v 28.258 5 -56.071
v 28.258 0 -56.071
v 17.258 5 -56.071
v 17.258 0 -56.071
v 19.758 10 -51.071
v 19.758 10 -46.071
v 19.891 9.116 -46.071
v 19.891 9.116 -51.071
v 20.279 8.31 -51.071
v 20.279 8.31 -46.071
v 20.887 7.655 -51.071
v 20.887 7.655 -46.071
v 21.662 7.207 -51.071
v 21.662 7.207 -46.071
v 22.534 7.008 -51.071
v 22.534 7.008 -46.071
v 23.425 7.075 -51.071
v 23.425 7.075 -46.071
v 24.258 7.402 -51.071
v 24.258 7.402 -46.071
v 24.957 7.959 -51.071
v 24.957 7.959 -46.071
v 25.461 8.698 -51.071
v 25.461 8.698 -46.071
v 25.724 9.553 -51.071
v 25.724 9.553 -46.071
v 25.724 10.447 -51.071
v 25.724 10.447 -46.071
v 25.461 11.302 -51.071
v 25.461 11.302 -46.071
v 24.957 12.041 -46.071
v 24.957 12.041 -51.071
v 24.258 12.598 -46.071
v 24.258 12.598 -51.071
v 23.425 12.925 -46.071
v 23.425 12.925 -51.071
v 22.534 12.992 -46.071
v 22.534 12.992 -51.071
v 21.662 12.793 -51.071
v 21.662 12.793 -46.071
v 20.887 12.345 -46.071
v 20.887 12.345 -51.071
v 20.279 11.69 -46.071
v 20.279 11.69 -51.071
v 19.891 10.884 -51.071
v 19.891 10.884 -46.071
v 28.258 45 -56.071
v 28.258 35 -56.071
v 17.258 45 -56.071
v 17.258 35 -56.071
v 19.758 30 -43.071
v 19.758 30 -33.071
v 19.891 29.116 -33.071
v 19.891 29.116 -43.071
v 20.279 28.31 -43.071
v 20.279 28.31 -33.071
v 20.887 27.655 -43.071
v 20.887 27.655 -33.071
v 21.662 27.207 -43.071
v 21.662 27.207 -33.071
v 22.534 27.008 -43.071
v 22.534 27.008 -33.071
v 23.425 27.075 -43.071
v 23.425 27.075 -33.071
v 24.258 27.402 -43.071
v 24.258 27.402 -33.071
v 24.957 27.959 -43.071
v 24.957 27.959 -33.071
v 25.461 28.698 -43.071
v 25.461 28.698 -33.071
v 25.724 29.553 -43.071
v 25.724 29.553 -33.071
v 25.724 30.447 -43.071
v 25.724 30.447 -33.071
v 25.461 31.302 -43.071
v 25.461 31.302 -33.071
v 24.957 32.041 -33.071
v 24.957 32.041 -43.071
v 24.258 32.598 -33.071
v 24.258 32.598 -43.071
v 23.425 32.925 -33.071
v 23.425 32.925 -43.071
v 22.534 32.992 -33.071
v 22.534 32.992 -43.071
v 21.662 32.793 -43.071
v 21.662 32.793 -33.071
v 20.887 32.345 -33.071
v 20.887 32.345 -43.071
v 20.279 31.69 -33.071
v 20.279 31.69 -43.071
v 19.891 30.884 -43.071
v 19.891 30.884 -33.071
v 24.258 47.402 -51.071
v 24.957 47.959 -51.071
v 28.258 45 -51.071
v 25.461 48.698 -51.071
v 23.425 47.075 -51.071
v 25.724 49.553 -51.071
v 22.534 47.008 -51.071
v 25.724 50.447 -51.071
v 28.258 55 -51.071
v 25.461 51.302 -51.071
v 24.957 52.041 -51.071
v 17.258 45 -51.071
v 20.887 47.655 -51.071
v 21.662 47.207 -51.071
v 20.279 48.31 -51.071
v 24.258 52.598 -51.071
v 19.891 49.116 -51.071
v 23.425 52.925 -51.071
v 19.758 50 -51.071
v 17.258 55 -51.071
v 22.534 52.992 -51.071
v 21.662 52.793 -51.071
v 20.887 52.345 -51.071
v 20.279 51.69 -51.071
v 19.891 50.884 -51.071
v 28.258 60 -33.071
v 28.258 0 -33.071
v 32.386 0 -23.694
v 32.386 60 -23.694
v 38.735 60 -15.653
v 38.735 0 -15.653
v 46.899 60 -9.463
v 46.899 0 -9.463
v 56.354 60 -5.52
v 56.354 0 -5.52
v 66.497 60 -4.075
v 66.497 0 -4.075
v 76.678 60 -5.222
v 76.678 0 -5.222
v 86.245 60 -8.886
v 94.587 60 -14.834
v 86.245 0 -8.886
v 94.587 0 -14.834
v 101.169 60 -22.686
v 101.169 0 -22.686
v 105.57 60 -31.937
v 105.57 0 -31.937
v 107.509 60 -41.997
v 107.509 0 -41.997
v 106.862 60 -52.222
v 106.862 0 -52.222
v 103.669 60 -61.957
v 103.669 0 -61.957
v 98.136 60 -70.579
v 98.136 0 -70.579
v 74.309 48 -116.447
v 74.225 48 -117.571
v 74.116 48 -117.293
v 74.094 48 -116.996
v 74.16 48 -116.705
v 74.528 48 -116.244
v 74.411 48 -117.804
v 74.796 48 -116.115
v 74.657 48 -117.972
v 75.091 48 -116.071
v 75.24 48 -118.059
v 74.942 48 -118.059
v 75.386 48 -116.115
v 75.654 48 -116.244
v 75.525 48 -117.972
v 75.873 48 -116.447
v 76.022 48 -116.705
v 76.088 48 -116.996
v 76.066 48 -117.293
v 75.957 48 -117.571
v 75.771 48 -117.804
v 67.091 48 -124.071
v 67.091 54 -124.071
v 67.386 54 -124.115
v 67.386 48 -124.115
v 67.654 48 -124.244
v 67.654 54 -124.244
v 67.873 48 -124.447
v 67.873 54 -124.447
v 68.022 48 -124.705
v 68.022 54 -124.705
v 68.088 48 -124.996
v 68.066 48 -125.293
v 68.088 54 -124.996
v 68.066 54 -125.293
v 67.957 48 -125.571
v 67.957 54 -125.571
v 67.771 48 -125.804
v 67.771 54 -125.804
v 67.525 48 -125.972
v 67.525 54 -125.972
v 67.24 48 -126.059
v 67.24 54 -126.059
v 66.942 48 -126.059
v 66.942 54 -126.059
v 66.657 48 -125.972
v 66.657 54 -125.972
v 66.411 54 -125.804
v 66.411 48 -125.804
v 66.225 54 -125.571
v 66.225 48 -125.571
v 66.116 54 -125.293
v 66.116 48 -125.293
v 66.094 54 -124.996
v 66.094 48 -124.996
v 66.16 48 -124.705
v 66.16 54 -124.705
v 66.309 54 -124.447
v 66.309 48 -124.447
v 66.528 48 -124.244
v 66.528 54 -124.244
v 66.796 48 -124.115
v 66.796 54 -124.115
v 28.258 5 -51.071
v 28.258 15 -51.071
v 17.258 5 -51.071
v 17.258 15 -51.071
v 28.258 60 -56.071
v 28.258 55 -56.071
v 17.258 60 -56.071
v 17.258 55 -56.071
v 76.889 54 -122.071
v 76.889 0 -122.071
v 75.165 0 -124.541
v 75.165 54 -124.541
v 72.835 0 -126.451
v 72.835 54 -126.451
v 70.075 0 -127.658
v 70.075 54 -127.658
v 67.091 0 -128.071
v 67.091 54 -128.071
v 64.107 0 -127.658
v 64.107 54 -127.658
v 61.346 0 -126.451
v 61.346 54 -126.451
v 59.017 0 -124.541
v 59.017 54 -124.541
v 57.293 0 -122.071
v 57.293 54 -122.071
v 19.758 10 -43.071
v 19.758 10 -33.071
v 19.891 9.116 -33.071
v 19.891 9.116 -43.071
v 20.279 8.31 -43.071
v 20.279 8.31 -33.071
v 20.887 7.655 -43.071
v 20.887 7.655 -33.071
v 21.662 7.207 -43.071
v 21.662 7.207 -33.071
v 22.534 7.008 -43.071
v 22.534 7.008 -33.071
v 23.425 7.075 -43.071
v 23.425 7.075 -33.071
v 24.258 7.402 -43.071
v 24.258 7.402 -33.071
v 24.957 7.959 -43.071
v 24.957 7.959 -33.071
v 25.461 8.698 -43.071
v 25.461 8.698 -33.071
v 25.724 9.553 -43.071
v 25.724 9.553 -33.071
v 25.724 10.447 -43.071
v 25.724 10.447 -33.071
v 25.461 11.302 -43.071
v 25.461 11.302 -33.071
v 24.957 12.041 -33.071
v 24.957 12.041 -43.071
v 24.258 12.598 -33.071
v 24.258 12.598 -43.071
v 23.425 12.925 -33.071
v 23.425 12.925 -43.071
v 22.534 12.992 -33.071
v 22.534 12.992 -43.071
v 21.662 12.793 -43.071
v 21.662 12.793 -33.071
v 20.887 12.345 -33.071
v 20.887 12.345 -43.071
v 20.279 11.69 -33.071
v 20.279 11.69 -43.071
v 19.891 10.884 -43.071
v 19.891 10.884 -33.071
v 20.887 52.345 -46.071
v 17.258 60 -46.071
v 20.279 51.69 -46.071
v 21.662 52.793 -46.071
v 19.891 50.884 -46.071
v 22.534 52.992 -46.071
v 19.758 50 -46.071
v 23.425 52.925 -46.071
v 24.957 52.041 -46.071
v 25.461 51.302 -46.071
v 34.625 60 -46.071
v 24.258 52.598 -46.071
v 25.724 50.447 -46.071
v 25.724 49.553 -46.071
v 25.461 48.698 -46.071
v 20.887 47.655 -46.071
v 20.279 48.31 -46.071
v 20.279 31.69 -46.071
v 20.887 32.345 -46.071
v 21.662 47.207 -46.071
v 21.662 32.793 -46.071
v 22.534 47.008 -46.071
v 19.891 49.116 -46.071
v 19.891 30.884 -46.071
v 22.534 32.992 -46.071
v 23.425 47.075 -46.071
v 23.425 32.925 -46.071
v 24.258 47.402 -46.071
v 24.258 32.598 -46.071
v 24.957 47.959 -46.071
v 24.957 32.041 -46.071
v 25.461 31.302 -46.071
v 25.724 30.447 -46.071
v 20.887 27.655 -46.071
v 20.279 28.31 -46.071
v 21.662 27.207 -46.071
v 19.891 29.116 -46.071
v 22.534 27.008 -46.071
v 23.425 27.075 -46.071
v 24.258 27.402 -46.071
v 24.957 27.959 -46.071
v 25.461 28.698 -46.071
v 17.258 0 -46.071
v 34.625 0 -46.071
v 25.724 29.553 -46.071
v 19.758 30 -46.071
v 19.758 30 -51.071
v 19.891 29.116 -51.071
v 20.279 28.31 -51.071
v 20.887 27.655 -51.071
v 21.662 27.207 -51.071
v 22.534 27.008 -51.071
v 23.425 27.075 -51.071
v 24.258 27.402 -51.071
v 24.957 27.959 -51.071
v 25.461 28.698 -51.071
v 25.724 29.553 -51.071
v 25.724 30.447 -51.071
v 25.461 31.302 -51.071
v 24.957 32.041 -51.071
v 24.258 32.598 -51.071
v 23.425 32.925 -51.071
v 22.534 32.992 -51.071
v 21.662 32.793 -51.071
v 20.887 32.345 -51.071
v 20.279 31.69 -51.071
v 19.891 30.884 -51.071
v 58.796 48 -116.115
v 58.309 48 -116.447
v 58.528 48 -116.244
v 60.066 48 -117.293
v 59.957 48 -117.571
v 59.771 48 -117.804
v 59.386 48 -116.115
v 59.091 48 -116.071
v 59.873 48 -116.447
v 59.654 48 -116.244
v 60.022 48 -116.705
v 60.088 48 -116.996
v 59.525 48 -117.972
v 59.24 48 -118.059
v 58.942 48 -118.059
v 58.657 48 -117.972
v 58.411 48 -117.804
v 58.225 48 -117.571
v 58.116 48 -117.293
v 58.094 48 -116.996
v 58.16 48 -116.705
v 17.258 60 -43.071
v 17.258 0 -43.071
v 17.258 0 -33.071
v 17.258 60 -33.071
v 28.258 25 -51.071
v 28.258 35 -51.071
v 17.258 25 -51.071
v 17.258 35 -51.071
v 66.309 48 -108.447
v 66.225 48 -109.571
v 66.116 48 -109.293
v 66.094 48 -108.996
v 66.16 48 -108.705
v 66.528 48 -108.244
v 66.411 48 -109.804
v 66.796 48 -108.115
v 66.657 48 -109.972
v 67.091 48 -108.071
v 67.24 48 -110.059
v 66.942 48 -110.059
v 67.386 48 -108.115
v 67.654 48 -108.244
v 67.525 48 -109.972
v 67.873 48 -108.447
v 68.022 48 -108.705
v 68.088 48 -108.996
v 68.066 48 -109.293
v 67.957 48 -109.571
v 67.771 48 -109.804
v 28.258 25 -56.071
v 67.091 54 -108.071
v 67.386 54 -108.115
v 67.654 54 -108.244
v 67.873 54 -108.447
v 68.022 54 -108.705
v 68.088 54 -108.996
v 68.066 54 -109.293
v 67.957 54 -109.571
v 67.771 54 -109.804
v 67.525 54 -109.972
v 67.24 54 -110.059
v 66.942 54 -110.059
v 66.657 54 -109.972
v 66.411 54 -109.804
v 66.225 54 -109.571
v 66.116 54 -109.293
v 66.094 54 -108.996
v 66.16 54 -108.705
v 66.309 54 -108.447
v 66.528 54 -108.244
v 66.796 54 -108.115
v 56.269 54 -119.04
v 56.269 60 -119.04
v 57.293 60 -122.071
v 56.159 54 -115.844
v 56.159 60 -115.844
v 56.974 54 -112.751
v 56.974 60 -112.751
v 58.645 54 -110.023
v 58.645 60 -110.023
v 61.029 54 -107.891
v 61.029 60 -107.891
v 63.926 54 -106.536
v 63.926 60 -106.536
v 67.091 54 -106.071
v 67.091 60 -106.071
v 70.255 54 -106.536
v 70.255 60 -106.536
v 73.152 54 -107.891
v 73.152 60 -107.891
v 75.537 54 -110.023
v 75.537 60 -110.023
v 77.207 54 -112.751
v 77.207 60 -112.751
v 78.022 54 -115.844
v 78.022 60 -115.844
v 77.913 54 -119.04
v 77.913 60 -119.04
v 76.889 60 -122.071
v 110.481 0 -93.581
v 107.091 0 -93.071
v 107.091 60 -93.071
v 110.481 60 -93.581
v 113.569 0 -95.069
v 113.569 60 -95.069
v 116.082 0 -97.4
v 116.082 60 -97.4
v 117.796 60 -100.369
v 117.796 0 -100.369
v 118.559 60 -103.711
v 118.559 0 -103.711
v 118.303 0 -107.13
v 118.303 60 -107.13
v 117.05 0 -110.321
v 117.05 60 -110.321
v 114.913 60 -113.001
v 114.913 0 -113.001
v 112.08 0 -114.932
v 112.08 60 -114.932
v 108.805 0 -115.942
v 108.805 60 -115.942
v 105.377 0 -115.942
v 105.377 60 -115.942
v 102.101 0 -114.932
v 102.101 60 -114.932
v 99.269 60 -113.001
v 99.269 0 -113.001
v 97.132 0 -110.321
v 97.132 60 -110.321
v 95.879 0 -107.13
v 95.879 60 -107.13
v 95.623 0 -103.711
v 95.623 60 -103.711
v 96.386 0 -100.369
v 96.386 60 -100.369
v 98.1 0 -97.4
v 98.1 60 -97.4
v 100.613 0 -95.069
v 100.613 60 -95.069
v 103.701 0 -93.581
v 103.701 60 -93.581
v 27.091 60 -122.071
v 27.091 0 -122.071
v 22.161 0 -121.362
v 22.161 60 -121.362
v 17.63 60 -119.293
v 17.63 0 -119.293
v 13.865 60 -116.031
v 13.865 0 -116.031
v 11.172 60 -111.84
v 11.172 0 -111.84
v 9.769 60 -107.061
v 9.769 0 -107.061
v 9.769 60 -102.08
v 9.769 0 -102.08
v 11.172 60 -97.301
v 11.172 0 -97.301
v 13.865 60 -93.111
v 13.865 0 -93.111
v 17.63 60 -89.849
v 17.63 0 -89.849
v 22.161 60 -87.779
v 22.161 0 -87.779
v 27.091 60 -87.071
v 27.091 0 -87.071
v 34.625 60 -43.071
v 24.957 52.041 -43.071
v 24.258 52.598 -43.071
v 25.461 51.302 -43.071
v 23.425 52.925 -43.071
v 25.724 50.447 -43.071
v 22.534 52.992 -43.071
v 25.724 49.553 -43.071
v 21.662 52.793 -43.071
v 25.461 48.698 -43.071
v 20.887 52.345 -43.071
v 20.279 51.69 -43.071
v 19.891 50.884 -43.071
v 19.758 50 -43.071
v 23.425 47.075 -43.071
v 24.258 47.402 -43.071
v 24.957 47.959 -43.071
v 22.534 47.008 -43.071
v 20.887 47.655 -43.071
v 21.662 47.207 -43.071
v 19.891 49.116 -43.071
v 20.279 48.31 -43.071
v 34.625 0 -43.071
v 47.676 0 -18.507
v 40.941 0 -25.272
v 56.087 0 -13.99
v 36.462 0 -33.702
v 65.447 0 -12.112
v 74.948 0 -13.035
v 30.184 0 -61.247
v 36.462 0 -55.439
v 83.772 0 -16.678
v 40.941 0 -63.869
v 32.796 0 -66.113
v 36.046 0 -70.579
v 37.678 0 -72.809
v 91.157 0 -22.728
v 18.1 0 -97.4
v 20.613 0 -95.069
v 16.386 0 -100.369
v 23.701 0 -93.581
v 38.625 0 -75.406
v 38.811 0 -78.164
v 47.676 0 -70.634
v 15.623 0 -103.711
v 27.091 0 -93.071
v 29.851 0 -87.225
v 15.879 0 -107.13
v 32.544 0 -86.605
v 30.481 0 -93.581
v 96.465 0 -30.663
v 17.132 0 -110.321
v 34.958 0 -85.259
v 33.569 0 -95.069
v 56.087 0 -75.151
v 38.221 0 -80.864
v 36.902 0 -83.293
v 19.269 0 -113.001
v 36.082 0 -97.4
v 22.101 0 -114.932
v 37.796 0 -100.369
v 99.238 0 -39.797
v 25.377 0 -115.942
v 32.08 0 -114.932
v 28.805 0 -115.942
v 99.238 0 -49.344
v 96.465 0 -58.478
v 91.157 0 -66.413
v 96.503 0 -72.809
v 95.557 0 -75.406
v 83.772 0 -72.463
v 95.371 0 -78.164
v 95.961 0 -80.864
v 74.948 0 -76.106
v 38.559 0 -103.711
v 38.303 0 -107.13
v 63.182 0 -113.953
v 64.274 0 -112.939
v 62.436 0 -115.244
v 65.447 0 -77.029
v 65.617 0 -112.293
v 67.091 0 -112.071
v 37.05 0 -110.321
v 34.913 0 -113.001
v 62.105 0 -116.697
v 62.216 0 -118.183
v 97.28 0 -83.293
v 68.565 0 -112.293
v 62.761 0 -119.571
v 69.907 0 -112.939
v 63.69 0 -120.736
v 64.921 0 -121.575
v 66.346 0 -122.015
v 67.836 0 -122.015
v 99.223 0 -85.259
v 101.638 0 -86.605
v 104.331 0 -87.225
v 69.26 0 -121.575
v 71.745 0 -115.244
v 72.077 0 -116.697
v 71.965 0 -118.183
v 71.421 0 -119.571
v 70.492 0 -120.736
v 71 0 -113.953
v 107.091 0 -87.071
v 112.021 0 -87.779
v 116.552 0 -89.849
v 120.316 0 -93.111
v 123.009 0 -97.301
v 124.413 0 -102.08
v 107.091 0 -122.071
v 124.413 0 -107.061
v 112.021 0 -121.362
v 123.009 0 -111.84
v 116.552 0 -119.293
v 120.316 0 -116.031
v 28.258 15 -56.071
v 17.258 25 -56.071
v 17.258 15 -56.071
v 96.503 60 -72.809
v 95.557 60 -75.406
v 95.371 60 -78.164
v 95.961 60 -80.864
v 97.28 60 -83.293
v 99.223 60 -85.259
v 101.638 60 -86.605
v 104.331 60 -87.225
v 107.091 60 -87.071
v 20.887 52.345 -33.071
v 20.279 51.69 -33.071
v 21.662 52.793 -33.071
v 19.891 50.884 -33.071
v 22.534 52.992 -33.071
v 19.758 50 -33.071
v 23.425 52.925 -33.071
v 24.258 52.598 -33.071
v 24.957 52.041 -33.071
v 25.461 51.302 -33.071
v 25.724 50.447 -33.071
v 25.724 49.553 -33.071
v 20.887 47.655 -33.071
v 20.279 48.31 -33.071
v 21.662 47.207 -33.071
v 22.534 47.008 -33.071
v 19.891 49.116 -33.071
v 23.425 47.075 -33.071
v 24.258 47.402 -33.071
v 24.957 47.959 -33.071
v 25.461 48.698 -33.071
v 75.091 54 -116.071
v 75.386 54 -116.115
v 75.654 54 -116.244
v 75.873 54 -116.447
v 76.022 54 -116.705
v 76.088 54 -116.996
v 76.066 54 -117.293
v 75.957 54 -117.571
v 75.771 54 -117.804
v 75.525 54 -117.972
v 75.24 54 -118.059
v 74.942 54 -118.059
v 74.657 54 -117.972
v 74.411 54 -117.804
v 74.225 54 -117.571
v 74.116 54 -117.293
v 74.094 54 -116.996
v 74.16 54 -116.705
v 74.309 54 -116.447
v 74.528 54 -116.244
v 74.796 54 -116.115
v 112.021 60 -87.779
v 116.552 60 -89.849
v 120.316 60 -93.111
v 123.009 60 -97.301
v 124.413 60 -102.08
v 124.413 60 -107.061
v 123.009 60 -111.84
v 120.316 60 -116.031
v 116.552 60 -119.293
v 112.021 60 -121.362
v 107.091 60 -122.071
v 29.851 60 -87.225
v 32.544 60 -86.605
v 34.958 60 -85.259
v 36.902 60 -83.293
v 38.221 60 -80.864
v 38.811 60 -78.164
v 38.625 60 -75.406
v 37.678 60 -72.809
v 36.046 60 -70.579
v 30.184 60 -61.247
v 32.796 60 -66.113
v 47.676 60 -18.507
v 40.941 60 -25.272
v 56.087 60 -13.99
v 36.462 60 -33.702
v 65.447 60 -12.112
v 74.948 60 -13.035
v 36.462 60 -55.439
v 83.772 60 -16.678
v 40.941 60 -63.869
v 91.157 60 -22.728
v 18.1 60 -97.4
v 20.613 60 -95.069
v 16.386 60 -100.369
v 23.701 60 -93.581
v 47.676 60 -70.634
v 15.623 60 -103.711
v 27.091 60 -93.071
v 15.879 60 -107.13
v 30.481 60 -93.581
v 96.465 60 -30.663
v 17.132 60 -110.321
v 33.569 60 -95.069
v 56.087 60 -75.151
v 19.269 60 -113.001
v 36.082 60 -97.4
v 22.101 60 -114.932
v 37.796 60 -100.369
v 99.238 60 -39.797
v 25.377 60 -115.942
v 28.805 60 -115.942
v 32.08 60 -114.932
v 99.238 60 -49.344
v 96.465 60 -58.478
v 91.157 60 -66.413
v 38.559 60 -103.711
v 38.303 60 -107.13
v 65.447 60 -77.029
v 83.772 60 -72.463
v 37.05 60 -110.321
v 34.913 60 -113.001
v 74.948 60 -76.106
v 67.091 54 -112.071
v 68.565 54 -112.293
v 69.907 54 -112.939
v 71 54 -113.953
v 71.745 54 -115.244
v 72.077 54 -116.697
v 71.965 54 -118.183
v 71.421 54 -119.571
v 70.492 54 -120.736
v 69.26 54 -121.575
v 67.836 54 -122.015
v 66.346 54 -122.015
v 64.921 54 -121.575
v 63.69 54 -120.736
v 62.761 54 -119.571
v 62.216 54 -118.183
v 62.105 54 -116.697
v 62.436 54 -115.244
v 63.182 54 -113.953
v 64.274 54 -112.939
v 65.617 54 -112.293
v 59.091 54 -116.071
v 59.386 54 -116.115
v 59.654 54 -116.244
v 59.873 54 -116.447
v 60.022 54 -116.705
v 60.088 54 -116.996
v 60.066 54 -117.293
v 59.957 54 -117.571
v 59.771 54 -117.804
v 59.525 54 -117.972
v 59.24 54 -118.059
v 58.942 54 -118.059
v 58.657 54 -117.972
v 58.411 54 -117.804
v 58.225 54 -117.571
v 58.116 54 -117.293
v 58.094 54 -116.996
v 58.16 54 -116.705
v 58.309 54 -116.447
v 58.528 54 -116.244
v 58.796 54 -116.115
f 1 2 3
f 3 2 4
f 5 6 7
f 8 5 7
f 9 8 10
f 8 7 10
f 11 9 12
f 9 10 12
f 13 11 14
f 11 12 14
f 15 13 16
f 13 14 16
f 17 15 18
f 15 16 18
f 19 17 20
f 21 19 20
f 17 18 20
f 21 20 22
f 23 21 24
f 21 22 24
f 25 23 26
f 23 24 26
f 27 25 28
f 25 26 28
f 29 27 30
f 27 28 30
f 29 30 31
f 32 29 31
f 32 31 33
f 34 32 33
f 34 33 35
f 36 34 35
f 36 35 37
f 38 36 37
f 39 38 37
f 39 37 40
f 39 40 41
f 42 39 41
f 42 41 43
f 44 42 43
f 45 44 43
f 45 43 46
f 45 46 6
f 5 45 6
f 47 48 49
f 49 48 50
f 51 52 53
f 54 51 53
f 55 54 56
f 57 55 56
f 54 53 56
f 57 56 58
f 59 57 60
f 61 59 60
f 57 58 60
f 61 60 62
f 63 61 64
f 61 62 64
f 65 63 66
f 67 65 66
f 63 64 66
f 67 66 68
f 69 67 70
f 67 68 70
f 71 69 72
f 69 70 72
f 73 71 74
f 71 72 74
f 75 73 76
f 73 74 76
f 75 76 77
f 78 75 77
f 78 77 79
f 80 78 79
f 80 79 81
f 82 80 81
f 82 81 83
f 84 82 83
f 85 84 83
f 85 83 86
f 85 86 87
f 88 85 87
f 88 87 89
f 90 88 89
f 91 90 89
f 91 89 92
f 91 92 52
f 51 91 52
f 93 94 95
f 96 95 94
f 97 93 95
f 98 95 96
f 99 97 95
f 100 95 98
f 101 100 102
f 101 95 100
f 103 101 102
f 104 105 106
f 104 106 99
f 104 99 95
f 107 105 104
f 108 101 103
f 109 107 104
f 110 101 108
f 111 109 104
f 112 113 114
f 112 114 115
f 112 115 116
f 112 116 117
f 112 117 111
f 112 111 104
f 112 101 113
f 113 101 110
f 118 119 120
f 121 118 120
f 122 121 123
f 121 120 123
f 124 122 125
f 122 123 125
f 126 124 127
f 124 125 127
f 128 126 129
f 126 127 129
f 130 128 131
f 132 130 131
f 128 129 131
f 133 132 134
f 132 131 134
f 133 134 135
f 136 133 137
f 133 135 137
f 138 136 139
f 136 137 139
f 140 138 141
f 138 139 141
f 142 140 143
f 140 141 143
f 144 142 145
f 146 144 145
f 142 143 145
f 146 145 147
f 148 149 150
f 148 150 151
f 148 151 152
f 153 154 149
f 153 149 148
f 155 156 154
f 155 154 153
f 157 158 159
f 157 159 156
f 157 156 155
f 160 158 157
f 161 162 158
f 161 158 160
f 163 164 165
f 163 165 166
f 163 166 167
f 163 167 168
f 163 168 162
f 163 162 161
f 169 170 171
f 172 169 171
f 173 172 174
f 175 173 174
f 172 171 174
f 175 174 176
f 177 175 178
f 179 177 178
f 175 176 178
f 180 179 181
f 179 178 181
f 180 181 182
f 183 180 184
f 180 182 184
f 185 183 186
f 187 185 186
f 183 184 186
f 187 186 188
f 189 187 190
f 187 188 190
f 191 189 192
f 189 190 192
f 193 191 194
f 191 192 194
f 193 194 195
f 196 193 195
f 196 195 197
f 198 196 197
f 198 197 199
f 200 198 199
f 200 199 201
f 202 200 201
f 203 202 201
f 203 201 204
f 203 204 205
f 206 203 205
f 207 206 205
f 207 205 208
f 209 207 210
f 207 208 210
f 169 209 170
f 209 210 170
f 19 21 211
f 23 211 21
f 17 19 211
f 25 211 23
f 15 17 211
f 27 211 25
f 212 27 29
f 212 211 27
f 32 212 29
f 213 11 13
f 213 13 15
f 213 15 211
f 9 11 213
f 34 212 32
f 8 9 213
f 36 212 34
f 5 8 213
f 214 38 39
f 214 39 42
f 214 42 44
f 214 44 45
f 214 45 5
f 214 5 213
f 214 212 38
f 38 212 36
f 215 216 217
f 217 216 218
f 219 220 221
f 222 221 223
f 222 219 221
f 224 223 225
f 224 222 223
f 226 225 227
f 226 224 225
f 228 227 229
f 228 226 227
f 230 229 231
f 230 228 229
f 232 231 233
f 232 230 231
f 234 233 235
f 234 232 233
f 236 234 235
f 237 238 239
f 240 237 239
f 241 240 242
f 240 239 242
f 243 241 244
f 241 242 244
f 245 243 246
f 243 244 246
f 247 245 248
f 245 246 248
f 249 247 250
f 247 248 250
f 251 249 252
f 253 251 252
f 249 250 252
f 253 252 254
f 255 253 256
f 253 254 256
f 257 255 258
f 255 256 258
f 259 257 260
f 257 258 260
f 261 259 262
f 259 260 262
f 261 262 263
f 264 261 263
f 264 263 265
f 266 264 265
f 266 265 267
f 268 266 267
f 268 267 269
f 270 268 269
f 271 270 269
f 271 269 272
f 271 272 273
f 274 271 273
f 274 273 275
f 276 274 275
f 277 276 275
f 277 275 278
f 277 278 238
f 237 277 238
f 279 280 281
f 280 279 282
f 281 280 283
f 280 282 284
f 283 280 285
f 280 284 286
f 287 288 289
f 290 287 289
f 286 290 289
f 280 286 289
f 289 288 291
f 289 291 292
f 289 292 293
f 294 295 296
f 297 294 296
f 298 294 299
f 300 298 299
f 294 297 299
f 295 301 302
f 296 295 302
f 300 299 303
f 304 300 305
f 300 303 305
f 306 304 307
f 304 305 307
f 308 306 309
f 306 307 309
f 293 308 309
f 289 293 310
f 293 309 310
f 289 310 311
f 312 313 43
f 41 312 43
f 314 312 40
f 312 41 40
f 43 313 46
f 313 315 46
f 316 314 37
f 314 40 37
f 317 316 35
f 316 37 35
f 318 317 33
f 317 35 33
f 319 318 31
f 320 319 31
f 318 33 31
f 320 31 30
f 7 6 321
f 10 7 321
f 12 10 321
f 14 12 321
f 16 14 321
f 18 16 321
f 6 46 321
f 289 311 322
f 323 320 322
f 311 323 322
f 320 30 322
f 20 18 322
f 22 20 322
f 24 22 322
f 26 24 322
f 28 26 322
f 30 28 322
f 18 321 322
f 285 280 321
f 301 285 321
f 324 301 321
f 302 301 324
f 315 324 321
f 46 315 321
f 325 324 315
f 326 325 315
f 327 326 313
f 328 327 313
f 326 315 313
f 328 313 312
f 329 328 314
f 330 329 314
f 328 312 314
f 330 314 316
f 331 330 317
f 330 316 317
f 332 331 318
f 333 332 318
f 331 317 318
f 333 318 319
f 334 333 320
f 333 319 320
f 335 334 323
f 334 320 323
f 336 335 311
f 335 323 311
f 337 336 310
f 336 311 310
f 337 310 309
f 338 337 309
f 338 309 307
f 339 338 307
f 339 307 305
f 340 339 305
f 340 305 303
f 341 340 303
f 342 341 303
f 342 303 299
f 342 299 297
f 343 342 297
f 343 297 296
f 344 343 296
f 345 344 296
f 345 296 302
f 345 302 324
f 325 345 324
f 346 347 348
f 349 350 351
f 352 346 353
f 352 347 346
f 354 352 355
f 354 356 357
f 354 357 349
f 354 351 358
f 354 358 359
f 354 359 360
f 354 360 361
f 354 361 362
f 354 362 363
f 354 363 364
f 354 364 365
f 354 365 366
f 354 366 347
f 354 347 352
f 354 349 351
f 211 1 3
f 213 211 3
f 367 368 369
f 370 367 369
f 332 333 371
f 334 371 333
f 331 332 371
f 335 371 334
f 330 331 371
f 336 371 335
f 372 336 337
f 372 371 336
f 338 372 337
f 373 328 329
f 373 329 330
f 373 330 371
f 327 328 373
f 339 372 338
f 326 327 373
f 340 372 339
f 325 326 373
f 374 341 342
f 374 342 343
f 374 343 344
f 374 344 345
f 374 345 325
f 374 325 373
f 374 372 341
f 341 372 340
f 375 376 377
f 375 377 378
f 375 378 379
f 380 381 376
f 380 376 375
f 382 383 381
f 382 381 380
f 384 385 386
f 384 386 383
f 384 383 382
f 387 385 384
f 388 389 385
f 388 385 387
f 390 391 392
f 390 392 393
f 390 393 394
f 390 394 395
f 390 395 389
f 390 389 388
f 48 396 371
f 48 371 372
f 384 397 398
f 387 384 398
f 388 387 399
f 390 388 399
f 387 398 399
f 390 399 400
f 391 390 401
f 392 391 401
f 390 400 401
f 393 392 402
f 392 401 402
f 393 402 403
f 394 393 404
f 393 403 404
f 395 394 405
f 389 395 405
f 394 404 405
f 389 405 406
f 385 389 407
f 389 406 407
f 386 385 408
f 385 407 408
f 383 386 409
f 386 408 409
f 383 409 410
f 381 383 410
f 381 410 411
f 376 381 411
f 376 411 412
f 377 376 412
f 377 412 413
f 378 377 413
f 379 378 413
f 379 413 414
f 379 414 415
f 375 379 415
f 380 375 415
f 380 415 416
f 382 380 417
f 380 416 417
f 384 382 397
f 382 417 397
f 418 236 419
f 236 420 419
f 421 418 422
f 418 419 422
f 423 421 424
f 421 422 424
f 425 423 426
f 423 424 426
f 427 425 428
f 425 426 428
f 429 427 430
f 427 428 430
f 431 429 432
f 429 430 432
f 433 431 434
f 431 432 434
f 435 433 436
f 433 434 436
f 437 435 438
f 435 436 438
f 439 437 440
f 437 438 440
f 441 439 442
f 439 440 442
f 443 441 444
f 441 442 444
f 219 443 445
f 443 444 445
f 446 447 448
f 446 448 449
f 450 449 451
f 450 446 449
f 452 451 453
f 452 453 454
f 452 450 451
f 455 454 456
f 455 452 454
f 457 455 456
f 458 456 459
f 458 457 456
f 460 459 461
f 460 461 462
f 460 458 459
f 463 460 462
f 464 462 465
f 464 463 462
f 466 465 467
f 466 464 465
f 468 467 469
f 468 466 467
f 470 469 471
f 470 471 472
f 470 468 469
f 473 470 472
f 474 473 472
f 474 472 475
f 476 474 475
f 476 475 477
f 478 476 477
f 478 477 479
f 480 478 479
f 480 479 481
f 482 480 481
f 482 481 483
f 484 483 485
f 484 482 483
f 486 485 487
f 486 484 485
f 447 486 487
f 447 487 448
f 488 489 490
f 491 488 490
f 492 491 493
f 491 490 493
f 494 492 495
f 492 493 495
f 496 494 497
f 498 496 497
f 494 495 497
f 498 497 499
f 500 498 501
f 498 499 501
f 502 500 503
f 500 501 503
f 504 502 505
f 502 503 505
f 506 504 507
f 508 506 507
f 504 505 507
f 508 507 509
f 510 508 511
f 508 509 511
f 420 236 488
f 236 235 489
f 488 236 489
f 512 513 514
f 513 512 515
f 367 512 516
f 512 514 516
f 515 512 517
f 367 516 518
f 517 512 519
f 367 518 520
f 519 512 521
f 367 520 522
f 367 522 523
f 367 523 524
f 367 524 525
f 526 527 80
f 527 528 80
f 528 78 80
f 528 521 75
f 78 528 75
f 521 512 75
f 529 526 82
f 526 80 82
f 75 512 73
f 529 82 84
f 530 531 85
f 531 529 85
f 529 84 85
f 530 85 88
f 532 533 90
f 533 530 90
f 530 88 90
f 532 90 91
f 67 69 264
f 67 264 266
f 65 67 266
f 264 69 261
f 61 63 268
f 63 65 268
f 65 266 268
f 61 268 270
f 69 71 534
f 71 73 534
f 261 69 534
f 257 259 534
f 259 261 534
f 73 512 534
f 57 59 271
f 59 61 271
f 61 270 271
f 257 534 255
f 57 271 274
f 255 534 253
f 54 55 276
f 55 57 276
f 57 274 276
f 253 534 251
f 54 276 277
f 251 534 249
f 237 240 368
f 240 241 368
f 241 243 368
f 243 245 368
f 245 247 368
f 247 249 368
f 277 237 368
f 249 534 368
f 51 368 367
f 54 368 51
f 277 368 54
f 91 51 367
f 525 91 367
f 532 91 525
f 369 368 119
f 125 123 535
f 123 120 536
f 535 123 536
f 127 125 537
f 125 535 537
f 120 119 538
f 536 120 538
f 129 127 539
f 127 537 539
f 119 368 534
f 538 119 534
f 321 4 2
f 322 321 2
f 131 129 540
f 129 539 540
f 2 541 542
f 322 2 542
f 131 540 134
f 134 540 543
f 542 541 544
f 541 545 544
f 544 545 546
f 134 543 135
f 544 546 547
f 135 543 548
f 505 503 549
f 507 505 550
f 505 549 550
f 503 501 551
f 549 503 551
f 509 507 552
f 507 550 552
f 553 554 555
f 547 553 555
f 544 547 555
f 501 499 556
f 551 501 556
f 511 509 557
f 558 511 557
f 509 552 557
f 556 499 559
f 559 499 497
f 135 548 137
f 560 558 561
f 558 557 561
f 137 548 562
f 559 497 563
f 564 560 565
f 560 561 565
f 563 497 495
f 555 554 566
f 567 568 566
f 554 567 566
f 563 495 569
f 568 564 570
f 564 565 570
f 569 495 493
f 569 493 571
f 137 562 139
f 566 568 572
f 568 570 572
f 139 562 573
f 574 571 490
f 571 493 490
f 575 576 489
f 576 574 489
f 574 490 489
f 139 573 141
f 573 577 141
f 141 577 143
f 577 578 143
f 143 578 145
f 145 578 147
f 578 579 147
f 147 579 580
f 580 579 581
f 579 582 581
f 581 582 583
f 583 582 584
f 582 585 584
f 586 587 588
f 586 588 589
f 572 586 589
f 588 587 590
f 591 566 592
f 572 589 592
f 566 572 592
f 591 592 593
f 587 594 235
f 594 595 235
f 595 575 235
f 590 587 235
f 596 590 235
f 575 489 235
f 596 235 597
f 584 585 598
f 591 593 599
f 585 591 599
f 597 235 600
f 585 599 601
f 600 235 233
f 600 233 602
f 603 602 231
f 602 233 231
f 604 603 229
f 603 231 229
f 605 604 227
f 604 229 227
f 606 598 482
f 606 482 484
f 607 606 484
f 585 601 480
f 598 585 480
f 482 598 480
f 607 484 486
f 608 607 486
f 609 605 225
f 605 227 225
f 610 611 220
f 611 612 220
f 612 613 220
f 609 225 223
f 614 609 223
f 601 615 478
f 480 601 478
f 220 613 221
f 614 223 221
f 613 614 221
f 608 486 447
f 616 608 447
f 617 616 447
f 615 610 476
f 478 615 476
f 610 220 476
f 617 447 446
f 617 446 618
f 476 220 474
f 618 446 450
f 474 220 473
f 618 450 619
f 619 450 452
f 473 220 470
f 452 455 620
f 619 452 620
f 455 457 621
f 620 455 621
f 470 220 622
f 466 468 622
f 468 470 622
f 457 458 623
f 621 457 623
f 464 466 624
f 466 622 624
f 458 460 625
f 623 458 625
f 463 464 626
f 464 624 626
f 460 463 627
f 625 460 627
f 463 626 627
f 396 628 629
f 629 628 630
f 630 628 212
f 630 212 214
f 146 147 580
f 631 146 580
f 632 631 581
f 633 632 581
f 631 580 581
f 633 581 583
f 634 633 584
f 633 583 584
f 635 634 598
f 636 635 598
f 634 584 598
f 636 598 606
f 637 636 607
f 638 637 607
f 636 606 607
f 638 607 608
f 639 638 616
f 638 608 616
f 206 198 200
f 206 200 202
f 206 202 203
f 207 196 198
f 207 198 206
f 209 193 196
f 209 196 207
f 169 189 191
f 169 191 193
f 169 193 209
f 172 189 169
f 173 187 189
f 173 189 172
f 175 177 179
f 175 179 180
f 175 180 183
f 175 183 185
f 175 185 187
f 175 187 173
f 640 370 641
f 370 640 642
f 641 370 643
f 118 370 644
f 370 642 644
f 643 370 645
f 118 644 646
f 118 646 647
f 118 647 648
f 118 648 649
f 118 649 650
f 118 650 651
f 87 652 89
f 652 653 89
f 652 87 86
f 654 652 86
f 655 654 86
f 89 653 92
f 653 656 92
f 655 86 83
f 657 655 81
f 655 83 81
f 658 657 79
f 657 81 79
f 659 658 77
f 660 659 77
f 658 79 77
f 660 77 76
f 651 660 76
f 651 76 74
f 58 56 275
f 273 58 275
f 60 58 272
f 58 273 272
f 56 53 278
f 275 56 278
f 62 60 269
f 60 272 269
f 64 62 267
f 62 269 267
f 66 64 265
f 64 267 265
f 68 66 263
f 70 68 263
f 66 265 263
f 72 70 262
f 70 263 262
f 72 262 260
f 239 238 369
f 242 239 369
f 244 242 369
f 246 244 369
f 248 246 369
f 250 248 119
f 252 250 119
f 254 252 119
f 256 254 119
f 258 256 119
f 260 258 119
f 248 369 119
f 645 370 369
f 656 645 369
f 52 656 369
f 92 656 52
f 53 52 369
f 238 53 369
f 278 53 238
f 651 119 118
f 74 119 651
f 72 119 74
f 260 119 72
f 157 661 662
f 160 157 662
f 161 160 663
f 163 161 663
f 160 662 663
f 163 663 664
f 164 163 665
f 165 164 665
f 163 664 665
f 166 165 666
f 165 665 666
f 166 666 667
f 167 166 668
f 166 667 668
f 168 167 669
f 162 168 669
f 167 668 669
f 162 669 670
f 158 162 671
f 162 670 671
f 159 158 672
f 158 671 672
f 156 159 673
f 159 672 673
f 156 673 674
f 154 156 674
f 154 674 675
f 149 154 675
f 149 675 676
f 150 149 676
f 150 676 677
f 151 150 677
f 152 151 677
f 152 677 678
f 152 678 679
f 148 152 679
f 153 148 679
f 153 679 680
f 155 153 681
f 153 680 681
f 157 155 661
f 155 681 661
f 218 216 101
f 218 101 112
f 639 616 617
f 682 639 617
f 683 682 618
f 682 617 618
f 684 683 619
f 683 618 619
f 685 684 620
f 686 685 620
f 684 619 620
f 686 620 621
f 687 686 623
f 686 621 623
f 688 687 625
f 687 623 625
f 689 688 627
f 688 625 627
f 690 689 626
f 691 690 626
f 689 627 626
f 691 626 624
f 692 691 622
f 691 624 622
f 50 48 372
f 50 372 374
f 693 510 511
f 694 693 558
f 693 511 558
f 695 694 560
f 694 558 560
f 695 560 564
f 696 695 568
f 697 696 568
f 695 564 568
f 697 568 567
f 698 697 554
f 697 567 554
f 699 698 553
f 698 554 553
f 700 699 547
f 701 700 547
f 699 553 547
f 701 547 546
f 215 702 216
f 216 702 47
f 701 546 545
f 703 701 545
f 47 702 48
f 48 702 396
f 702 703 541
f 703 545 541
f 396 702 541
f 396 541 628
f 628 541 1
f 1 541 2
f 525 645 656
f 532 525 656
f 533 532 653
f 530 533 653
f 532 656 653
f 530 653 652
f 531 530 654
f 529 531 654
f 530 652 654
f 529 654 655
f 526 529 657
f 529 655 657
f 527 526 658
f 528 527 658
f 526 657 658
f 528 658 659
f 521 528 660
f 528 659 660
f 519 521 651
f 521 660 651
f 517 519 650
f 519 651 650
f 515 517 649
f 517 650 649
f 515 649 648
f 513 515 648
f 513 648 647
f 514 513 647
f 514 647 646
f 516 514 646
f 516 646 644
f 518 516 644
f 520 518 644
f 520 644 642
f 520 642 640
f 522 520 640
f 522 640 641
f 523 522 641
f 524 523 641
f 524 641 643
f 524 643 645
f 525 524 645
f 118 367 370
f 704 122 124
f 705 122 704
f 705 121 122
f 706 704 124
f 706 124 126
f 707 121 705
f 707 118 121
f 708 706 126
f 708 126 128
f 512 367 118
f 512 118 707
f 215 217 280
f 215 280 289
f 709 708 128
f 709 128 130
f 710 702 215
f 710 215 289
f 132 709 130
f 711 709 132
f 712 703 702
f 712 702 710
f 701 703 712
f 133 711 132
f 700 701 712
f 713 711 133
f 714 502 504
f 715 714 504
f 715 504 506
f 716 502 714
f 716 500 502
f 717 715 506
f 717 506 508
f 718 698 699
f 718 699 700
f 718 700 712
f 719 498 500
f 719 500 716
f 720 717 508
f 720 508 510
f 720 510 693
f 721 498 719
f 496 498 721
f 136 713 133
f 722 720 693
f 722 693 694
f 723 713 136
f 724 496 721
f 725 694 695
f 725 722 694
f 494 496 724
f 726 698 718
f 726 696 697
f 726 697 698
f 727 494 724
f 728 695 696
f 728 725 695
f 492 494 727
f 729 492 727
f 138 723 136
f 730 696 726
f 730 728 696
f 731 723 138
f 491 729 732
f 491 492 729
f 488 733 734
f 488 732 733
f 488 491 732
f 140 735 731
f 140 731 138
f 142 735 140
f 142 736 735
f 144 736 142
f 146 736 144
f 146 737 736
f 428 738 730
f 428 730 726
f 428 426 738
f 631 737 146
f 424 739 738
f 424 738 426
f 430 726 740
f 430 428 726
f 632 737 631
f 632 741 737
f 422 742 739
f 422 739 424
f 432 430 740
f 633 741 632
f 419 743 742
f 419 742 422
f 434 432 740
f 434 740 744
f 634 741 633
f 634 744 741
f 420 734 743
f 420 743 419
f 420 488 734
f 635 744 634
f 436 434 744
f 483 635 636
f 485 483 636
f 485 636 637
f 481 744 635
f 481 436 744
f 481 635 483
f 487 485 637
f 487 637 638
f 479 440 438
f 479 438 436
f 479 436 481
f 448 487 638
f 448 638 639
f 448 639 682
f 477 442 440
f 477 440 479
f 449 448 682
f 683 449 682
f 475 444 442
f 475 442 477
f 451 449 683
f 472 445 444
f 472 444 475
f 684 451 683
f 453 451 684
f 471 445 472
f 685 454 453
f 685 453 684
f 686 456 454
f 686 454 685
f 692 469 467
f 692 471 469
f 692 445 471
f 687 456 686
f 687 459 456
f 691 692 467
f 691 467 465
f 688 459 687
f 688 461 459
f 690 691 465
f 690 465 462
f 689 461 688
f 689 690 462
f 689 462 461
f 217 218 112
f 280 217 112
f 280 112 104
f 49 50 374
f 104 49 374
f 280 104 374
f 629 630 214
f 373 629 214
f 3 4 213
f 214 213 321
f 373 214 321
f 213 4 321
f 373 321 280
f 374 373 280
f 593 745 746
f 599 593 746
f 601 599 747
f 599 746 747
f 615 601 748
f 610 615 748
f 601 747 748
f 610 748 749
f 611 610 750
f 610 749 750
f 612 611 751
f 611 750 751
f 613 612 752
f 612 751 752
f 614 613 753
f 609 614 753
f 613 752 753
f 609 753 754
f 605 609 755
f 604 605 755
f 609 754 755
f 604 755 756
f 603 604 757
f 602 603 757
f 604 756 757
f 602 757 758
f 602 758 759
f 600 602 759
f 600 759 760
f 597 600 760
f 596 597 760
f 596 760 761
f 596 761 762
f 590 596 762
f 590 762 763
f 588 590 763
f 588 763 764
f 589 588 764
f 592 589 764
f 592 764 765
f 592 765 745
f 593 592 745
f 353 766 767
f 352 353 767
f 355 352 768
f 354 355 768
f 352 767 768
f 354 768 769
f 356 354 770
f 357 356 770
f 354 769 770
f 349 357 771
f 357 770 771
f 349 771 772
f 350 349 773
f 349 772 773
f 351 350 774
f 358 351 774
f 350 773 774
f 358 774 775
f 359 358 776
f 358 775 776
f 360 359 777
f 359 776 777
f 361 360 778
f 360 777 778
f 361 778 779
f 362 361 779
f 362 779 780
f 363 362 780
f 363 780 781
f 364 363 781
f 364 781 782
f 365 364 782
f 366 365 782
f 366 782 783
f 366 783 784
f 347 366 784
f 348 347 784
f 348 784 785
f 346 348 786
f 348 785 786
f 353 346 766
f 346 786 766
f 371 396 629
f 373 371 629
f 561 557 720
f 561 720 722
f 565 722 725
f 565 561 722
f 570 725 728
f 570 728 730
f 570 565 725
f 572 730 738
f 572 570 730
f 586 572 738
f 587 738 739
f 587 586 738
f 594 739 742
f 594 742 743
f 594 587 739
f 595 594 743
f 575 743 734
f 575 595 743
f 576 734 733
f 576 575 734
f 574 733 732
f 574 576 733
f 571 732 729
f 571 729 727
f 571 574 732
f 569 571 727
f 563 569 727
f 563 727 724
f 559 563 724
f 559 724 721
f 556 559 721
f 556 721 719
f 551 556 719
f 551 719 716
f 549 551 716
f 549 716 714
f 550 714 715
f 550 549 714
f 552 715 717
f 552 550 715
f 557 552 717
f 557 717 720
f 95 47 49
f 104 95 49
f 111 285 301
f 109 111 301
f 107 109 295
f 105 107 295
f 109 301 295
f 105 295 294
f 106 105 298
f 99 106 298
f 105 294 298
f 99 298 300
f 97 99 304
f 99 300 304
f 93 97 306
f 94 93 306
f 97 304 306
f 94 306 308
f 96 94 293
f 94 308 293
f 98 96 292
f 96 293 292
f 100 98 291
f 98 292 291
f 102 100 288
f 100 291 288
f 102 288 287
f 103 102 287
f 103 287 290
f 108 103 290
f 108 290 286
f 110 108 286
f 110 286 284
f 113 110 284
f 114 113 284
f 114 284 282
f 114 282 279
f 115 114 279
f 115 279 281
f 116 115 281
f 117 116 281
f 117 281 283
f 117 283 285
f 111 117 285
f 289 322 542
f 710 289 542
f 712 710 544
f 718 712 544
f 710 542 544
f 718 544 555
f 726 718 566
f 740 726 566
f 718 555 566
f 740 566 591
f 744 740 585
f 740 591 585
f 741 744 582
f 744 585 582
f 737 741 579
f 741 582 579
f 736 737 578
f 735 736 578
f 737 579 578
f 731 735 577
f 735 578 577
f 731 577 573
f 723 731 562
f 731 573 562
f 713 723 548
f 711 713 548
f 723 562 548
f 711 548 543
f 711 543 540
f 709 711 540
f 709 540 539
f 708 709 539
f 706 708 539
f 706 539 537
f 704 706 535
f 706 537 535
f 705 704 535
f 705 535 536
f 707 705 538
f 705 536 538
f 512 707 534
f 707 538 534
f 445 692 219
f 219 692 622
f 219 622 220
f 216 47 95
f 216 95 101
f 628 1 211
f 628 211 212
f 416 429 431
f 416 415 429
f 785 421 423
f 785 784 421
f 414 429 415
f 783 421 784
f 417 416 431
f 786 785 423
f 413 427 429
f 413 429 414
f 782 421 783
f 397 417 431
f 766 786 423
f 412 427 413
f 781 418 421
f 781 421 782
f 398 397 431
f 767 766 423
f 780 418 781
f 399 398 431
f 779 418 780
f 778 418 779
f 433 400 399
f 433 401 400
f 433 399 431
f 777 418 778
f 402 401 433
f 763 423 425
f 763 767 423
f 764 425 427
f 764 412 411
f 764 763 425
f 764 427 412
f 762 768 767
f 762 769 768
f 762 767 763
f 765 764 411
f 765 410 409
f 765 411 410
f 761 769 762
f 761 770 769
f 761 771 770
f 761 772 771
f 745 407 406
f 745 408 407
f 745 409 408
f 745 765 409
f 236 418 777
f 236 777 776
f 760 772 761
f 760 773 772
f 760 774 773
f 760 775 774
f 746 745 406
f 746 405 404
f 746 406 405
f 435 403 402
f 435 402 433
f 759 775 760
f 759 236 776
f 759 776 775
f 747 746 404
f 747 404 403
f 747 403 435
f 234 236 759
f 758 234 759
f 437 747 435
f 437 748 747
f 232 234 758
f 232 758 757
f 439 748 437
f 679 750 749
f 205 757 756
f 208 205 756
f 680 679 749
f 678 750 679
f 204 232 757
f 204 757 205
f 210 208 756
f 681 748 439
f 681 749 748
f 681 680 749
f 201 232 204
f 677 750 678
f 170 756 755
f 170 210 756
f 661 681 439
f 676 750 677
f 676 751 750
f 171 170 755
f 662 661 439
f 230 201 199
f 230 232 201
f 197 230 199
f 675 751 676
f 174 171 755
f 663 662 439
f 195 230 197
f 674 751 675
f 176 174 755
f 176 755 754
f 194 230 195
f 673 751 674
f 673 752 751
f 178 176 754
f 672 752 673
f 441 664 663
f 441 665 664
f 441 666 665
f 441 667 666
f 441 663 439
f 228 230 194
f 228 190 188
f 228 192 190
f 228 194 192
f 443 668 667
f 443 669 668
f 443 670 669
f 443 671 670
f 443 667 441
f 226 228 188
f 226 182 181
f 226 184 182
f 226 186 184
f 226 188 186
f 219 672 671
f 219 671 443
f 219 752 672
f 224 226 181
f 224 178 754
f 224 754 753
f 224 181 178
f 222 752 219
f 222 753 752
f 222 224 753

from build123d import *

# Parameters (mm, degrees)
SKETCH1_R                      = 11.5
BOSS_EXTRUDE1_DEPTH            = 60
CUT_EXTRUDE1_REACH             = 167.294
SKETCH2_R                      = 3
CUT_EXTRUDE1_DIRECTION_2_DEPTH = 166.294105853
SKETCH3_W                      = 11
SKETCH3_H                      = 10
CUT_EXTRUDE2_DEPTH             = 5
SKETCH5_R                      = 11
BOSS_EXTRUDE2_DEPTH            = 60
SKETCH5_12_R                   = 11
CUT_EXTRUDE7_DEPTH             = 6
SKETCH5_13_R                   = 5
CUT_EXTRUDE8_DEPTH             = 189.480626049
CUT_EXTRUDE9_START             = -6
SKETCH5_14_R                   = 1
CUT_EXTRUDE9_DEPTH             = 6


with BuildPart() as part:
    # Sketch1 → Boss-Extrude1 (new body)
    with BuildSketch(Plane(origin=(0, 0, 0), x_dir=(1, 0, 0), z_dir=(0, 1, 0))):
        with BuildLine():
            Line((17.257858547, 56.070568137), (17.257858547, 46.070568137))
            Line((17.257858547, 46.070568137), (34.625468063, 46.070568137))
            ThreePointArc((34.625468063, 46.070568137), (99.590834225, 44.570568137), (34.625468063, 43.070568137))
            Line((34.625468063, 43.070568137), (17.257858547, 43.070568137))
            Line((17.257858547, 43.070568137), (17.257858547, 33.070568137))
            Line((17.257858547, 33.070568137), (28.257858547, 33.070568137))
            ThreePointArc((28.257858547, 33.070568137), (86.245043845, 8.88631035), (98.136101416, 70.579054926))
            ThreePointArc((98.136101416, 70.579054926), (96.534674627, 82.125537677), (107.090834225, 87.070568137))
            ThreePointArc((107.090834225, 87.070568137), (124.590834225, 104.570568137), (107.090834225, 122.070568137))
            Line((107.090834225, 122.070568137), (27.090834225, 122.070568137))
            ThreePointArc((27.090834225, 122.070568137), (9.590834225, 104.570568137), (27.090834225, 87.070568137))
            ThreePointArc((27.090834225, 87.070568137), (37.646993822, 82.125537677), (36.045567034, 70.579054926))
            ThreePointArc((36.045567034, 70.579054926), (31.406576437, 63.724777757), (28.257858547, 56.070568137))
            Line((28.257858547, 56.070568137), (17.257858547, 56.070568137))
        make_face()
        with Locations(Location((27.090834225, 104.570568137, 0), (0, 0, 270))):
            Circle(SKETCH1_R, mode=Mode.SUBTRACT)
        with Locations(Location((107.090834225, 104.570568137, 0), (0, 0, 270))):
            Circle(SKETCH1_R, mode=Mode.SUBTRACT)
    extrude(amount=BOSS_EXTRUDE1_DEPTH)

    # Cut-Extrude1: up to this face of the body (flat: up to its plane)
    cut_extrude1_end = Plane(part.part.faces().sort_by_distance((22.757858547, 30, -56.070568137))[0])
    # Sketch2 → Cut-Extrude1 (cut, up to the picked face)
    with BuildSketch(Plane(origin=(-1.111756956, 0, -33.070568137), x_dir=(1, 0, 0), z_dir=(0, 0, 1)), mode=Mode.PRIVATE) as cut_extrude1_sk1:
        with Locations(Location((23.869615503, 30, 0), (0, 0, 180))):
            Circle(SKETCH2_R)
    cut_extrude1_tool1 = split(extrude(cut_extrude1_sk1.sketch, amount=-CUT_EXTRUDE1_REACH, mode=Mode.PRIVATE), bisect_by=cut_extrude1_end, keep=Keep.BOTH, mode=Mode.PRIVATE)
    # Sketch2 → Cut-Extrude1 (cut, up to the picked face)
    with BuildSketch(Plane(origin=(-1.111756956, 0, -33.070568137), x_dir=(1, 0, 0), z_dir=(0, 0, 1)), mode=Mode.PRIVATE) as cut_extrude1_sk2:
        with Locations(Location((23.869615503, 50, 0), (0, 0, 180))):
            Circle(SKETCH2_R)
    cut_extrude1_tool2 = split(extrude(cut_extrude1_sk2.sketch, amount=-CUT_EXTRUDE1_REACH, mode=Mode.PRIVATE), bisect_by=cut_extrude1_end, keep=Keep.BOTH, mode=Mode.PRIVATE)
    # Sketch2 → Cut-Extrude1 (cut, up to the picked face)
    with BuildSketch(Plane(origin=(-1.111756956, 0, -33.070568137), x_dir=(1, 0, 0), z_dir=(0, 0, 1)), mode=Mode.PRIVATE) as cut_extrude1_sk3:
        with Locations(Location((23.869615503, 10, 0), (0, 0, 180))):
            Circle(SKETCH2_R)
    cut_extrude1_tool3 = split(extrude(cut_extrude1_sk3.sketch, amount=-CUT_EXTRUDE1_REACH, mode=Mode.PRIVATE), bisect_by=cut_extrude1_end, keep=Keep.BOTH, mode=Mode.PRIVATE)
    add(cut_extrude1_tool1.solids().sort_by(Axis((22.757859, 30, -33.070568), (0, 0, -1)))[0], mode=Mode.SUBTRACT)
    add(cut_extrude1_tool2.solids().sort_by(Axis((22.757859, 50, -33.070568), (0, 0, -1)))[0], mode=Mode.SUBTRACT)
    add(cut_extrude1_tool3.solids().sort_by(Axis((22.757859, 10, -33.070568), (0, 0, -1)))[0], mode=Mode.SUBTRACT)

    # Sketch2 → Cut-Extrude1 direction 2 (cut)
    with BuildSketch(Plane(origin=(-1.111756956, 0, -33.070568137), x_dir=(1, 0, 0), z_dir=(0, 0, 1))):
        with Locations(Location((23.869615503, 30, 0), (0, 0, 180))):
            Circle(SKETCH2_R)
        with Locations(Location((23.869615503, 50, 0), (0, 0, 180))):
            Circle(SKETCH2_R)
        with Locations(Location((23.869615503, 10, 0), (0, 0, 180))):
            Circle(SKETCH2_R)
    extrude(amount=CUT_EXTRUDE1_DIRECTION_2_DEPTH, mode=Mode.SUBTRACT)

    # Sketch3 → Cut-Extrude2 (cut)
    with BuildSketch(Plane(origin=(0, 0, -56.070568137), x_dir=(-1, 0, 0), z_dir=(0, 0, -1))):
        with Locations((-22.757858547, 50)):
            Rectangle(SKETCH3_W, SKETCH3_H)
        with Locations((-22.757858547, 30)):
            Rectangle(SKETCH3_W, SKETCH3_H)
        with Locations((-22.757858547, 10)):
            Rectangle(SKETCH3_W, SKETCH3_H)
    extrude(amount=-CUT_EXTRUDE2_DEPTH, mode=Mode.SUBTRACT)

    # Sketch5 → Boss-Extrude2 (add)
    with BuildSketch(Plane(origin=(0, 60, 0), x_dir=(1, 0, 0), z_dir=(0, 1, 0))):
        with Locations((67.090834225, 117.070568137)):
            Circle(SKETCH5_R)
    extrude(amount=-BOSS_EXTRUDE2_DEPTH)

    # Sketch5<12> → Cut-Extrude7 (cut)
    with BuildSketch(Plane(origin=(0, 60, 0), x_dir=(1, 0, 0), z_dir=(0, 1, 0))):
        with Locations((67.090834225, 117.070568137)):
            Circle(SKETCH5_12_R)
    extrude(amount=-CUT_EXTRUDE7_DEPTH, mode=Mode.SUBTRACT)

    # Sketch5<13> → Cut-Extrude8 (cut, through all)
    with BuildSketch(Plane(origin=(0, 60, 0), x_dir=(1, 0, 0), z_dir=(0, 1, 0))):
        with Locations(Location((67.090834225, 117.070568137, 0), (0, 0, 270))):
            Circle(SKETCH5_13_R)
    extrude(amount=-CUT_EXTRUDE8_DEPTH, mode=Mode.SUBTRACT)

    # Sketch5<14> → Cut-Extrude9 (cut)
    with BuildSketch(Plane(origin=(0, 60, 0), x_dir=(1, 0, 0), z_dir=(0, 1, 0)).offset(CUT_EXTRUDE9_START)):
        with Locations(Location((67.090834225, 125.070568137, 0), (0, 0, 270))):
            Circle(SKETCH5_14_R)
        with Locations(Location((75.090834225, 117.070568137, 0), (0, 0, 270))):
            Circle(SKETCH5_14_R)
        with Locations(Location((67.090834225, 109.070568137, 0), (0, 0, 270))):
            Circle(SKETCH5_14_R)
        with Locations(Location((59.090834225, 117.070568137, 0), (0, 0, 270))):
            Circle(SKETCH5_14_R)
    extrude(amount=-CUT_EXTRUDE9_DEPTH, mode=Mode.SUBTRACT)


solid = part.part
